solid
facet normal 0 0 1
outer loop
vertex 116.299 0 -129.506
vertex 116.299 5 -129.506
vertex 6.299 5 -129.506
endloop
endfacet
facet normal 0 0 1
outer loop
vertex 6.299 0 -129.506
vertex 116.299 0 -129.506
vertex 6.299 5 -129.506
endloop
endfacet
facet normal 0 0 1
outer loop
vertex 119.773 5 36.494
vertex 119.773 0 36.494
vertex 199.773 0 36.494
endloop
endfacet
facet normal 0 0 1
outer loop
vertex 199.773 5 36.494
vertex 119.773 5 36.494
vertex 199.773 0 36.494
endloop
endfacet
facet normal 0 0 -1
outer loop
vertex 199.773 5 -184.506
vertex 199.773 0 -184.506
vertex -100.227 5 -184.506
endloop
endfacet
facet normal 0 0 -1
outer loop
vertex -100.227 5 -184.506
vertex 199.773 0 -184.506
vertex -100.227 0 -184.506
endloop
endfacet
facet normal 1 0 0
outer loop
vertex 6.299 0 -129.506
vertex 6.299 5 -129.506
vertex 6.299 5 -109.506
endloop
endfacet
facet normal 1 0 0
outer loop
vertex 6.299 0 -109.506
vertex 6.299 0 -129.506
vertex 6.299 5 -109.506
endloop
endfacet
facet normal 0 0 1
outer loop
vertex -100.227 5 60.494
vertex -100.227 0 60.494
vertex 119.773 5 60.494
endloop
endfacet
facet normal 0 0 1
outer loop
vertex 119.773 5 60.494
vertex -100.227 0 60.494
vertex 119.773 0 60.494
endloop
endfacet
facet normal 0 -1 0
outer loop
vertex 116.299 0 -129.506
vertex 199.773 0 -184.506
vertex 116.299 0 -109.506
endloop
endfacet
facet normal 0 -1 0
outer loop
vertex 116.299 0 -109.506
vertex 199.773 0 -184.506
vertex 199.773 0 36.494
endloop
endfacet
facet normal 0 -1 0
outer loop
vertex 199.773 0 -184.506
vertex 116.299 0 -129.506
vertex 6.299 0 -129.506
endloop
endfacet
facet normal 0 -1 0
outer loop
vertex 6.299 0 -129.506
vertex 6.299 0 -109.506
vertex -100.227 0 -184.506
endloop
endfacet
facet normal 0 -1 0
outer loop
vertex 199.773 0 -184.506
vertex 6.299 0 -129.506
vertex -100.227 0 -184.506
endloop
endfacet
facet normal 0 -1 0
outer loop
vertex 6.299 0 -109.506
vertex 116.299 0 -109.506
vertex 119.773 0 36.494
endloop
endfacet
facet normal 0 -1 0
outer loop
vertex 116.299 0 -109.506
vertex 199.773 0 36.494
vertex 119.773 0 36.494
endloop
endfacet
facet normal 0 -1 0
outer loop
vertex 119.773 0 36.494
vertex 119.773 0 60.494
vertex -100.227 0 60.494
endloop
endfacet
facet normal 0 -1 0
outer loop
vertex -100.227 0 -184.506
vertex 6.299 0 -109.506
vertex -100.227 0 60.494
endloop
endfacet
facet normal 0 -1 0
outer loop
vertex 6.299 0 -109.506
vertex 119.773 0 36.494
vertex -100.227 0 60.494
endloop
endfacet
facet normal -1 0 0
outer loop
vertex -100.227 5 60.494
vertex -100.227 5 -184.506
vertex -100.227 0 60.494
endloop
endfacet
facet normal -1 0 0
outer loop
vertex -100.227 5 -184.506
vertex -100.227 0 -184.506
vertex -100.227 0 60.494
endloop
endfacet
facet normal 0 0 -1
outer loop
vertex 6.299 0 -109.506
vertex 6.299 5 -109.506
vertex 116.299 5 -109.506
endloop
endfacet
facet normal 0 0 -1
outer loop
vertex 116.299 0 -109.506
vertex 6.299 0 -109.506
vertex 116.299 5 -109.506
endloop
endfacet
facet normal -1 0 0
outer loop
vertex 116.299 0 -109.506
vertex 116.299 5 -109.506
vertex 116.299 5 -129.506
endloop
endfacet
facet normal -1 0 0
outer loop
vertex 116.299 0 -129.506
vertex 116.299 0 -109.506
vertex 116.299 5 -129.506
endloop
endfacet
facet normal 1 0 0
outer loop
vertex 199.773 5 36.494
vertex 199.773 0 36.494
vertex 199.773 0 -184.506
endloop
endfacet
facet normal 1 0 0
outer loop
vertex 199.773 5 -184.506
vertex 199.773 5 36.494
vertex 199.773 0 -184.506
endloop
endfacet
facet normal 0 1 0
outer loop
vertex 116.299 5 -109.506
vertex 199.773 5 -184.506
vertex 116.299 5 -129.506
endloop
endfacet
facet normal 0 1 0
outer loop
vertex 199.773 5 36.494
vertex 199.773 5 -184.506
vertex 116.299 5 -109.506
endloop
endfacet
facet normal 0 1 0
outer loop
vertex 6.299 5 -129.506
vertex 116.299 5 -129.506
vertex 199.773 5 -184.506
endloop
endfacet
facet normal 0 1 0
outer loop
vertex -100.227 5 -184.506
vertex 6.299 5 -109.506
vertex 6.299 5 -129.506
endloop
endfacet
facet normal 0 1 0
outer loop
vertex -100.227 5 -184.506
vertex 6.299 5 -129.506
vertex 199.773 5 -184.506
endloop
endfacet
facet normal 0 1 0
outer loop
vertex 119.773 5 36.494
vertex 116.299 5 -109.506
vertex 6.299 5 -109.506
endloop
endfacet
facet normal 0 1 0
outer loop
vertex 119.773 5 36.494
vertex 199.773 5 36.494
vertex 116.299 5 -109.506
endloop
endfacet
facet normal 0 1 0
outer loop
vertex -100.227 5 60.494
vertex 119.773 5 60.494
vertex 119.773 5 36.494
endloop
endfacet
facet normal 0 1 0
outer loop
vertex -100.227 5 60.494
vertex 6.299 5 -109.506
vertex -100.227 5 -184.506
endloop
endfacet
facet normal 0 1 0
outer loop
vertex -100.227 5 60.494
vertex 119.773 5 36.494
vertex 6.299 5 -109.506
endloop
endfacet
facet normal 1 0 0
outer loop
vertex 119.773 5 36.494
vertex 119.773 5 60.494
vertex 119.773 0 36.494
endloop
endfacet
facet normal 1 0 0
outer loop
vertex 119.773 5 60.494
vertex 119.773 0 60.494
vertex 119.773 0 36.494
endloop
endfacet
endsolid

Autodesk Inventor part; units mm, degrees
ref_plane "YZ Plane" through (0, 0, 0) normal (1, 0, 0) x (0, 1, 0)
ref_plane "XZ Plane" through (0, 0, 0) normal (0, 1, 0) x (-1, 0, 0)
ref_plane "XY Plane" through (0, 0, 0) normal (0, 0, 1) x (1, 0, 0)
sketch "Esquisse1" plane through (0, 0, 0) normal (0, 1, 0) x (-1, 0, 0)
  line L0 (100.2268, 60.494) -> (-119.7732, 60.494)
  line L1 (-199.7732, 36.494) -> (-199.7732, -184.506)
  line L2 (-199.7732, -184.506) -> (100.2268, -184.506)
  line L3 (100.2268, -184.506) -> (100.2268, 60.494)
  line L4 (-119.7732, 60.494) -> (-119.7732, 36.494)
  line L5 (-119.7732, 36.494) -> (-199.7732, 36.494)
  point P0 (0, 0)
  dimension "d0" = 245
  dimension "d1" = 300
  dimension "d4" = 221
  dimension "d5" = 80
extrude "Extrusion1" add sketch "Esquisse1" along normal blind 5
sketch "Esquisse2" plane through (0, 5, 0) normal (0, 1, 0) x (1, 0, 0)
  line L0 (6.299, 109.506) -> (116.299, 109.506)
  line L1 (116.299, 109.506) -> (116.299, 129.506)
  line L2 (116.299, 129.506) -> (6.299, 129.506)
  line L3 (6.299, 129.506) -> (6.299, 109.506)
  line L4 (199.7732, 184.506) -> (-100.2268, 184.506) projected
  point P0 (0, 0)
  dimension "d6" = 20
  dimension "d7" = 110
  dimension "d8" = 55
extrude "Extrusion2" cut sketch "Esquisse2" against normal through all
properties part number "cote"
